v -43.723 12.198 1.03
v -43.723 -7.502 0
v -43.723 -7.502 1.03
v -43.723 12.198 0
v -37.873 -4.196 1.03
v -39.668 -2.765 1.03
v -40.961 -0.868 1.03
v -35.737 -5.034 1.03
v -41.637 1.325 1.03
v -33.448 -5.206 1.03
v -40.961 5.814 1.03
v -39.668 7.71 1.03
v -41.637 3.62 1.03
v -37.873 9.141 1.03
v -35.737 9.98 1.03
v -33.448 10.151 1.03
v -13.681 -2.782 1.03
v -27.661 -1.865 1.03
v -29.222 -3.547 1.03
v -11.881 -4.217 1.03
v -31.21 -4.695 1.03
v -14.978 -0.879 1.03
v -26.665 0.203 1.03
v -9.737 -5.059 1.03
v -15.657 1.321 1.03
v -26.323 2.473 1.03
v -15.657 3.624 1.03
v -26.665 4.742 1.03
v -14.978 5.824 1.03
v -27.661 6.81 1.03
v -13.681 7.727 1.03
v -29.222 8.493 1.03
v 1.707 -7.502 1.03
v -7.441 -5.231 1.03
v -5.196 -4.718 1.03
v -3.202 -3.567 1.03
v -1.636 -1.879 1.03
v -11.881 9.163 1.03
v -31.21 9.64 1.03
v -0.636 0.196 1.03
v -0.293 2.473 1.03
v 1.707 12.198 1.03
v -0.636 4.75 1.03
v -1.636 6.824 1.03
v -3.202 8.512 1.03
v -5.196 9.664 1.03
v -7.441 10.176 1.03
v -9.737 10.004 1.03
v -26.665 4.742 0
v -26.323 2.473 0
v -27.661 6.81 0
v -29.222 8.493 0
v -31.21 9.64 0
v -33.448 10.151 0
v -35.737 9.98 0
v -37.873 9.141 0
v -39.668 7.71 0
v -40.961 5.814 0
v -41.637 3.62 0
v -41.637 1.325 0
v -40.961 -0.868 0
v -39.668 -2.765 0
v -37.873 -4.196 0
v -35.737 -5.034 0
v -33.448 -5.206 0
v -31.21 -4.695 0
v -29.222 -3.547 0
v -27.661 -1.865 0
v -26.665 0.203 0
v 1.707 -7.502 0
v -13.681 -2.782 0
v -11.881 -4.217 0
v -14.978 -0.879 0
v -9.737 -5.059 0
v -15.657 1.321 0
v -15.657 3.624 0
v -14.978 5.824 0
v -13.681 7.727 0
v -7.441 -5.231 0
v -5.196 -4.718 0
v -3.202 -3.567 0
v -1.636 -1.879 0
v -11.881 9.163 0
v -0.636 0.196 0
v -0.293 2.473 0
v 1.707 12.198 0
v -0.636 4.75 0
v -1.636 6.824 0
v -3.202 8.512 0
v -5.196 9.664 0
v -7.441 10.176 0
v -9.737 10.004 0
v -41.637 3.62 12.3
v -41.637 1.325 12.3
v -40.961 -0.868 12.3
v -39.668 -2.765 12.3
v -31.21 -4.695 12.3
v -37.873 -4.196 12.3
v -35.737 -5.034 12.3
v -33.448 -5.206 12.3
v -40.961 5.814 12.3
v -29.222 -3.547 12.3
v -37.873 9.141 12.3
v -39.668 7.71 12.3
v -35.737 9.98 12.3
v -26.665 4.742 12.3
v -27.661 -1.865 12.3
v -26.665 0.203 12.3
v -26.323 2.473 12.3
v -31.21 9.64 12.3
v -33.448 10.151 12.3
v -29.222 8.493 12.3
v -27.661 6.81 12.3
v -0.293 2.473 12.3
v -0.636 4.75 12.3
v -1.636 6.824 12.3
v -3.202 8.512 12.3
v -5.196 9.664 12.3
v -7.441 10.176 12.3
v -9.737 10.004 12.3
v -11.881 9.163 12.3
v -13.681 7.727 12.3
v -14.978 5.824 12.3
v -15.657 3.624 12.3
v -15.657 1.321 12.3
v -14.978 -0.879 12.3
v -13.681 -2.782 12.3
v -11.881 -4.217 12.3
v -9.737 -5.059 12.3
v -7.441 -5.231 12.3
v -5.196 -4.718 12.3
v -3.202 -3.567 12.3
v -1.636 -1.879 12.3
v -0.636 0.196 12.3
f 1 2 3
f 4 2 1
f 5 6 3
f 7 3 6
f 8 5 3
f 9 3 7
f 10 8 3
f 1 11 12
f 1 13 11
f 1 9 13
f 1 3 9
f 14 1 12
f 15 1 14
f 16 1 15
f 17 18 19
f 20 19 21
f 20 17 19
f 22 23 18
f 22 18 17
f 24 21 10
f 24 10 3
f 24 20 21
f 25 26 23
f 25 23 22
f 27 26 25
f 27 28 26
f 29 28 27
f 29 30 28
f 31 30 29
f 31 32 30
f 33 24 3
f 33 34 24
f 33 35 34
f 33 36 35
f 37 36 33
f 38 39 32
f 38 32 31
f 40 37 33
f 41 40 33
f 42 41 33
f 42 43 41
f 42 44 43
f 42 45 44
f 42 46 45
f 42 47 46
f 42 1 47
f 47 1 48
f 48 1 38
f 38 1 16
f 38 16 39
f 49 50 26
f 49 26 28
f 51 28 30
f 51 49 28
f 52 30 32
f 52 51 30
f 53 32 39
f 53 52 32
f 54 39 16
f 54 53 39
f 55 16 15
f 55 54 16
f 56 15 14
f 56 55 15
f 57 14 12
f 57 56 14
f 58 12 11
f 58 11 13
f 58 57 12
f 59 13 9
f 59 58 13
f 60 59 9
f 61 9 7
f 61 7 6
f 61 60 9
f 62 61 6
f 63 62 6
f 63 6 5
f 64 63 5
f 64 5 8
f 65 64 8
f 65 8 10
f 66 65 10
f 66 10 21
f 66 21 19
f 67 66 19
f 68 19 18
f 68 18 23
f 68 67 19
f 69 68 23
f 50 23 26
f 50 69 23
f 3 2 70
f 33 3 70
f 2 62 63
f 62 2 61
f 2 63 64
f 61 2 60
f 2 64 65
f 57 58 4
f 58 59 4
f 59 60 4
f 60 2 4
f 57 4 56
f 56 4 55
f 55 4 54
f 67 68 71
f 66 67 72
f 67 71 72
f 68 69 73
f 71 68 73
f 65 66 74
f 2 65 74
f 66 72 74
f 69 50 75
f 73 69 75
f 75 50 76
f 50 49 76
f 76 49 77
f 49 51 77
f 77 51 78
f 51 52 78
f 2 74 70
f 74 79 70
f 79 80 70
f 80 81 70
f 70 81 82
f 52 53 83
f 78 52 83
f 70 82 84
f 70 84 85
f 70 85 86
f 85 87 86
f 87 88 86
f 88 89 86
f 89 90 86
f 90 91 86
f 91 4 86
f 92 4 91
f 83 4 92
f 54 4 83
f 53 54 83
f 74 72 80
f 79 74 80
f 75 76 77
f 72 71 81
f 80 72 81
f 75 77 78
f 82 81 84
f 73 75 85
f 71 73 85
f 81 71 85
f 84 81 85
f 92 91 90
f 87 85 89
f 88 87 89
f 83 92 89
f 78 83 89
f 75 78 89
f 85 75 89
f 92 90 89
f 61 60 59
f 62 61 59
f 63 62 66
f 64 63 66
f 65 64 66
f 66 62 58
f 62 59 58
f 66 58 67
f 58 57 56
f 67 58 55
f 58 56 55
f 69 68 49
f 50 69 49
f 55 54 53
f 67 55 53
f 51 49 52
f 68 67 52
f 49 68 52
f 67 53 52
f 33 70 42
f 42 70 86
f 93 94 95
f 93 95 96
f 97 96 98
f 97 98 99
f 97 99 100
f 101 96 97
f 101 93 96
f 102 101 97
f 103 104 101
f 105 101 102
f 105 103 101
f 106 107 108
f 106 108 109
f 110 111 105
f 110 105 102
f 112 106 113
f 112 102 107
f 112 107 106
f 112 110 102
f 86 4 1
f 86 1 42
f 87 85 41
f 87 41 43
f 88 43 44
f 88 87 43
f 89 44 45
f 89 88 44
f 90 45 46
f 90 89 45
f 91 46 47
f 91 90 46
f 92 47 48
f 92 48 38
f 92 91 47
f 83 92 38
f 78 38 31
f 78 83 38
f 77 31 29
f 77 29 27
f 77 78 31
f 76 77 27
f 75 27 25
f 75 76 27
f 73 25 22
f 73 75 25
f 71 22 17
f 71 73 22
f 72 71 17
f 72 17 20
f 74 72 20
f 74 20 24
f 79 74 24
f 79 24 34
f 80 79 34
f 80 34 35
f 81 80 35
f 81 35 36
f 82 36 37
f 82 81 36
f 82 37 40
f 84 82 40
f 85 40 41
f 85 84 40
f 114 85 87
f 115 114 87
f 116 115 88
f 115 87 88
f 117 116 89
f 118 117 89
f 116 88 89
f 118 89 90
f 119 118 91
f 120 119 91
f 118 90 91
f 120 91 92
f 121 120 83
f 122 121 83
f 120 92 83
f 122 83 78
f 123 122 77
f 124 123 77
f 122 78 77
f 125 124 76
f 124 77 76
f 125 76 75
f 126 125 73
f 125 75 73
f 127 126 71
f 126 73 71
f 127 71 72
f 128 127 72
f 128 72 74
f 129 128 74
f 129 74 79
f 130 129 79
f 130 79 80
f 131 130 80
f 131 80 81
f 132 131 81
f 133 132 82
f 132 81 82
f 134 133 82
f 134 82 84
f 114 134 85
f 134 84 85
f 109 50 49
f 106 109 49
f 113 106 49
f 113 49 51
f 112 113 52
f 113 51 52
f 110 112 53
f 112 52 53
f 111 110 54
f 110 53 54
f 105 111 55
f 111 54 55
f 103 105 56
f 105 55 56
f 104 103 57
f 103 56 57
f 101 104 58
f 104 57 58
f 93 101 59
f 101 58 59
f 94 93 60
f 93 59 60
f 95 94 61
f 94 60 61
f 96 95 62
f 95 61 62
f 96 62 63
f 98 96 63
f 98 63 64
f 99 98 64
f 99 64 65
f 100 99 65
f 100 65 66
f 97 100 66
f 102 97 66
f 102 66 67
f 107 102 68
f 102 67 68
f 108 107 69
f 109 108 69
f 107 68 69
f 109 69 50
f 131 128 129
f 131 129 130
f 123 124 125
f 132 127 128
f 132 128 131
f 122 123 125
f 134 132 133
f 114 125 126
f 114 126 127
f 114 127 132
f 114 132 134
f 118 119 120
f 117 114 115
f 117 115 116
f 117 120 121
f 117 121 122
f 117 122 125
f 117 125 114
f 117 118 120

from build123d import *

# Parameters (mm, degrees)
F0_R     = 7.7
F0_R_2   = 7.725
F1_DEPTH = 12.3
F0_W     = 45.43
F0_H     = 19.7
F2_DEPTH = 1.03


with BuildPart() as f1:
    # F0 (on Top) → F1 (new body)
    with BuildSketch(Plane.XY):
        with Locations((-34.023199, 2.472709)):
            Circle(F0_R)
        with Locations((-8.018199, 2.472709)):
            Circle(F0_R_2)
    extrude(amount=F1_DEPTH)


with BuildPart() as f2:
    # F0 (on Top) → F2 (new body)
    with BuildSketch(Plane.XY):
        with Locations((-21.008199, 2.347709)):
            Rectangle(F0_W, F0_H)
        with Locations((-34.023199, 2.472709)):
            Circle(F0_R, mode=Mode.SUBTRACT)
        with Locations((-8.018199, 2.472709)):
            Circle(F0_R_2, mode=Mode.SUBTRACT)
    extrude(amount=F2_DEPTH)


solid = Compound([f1.part, f2.part])
